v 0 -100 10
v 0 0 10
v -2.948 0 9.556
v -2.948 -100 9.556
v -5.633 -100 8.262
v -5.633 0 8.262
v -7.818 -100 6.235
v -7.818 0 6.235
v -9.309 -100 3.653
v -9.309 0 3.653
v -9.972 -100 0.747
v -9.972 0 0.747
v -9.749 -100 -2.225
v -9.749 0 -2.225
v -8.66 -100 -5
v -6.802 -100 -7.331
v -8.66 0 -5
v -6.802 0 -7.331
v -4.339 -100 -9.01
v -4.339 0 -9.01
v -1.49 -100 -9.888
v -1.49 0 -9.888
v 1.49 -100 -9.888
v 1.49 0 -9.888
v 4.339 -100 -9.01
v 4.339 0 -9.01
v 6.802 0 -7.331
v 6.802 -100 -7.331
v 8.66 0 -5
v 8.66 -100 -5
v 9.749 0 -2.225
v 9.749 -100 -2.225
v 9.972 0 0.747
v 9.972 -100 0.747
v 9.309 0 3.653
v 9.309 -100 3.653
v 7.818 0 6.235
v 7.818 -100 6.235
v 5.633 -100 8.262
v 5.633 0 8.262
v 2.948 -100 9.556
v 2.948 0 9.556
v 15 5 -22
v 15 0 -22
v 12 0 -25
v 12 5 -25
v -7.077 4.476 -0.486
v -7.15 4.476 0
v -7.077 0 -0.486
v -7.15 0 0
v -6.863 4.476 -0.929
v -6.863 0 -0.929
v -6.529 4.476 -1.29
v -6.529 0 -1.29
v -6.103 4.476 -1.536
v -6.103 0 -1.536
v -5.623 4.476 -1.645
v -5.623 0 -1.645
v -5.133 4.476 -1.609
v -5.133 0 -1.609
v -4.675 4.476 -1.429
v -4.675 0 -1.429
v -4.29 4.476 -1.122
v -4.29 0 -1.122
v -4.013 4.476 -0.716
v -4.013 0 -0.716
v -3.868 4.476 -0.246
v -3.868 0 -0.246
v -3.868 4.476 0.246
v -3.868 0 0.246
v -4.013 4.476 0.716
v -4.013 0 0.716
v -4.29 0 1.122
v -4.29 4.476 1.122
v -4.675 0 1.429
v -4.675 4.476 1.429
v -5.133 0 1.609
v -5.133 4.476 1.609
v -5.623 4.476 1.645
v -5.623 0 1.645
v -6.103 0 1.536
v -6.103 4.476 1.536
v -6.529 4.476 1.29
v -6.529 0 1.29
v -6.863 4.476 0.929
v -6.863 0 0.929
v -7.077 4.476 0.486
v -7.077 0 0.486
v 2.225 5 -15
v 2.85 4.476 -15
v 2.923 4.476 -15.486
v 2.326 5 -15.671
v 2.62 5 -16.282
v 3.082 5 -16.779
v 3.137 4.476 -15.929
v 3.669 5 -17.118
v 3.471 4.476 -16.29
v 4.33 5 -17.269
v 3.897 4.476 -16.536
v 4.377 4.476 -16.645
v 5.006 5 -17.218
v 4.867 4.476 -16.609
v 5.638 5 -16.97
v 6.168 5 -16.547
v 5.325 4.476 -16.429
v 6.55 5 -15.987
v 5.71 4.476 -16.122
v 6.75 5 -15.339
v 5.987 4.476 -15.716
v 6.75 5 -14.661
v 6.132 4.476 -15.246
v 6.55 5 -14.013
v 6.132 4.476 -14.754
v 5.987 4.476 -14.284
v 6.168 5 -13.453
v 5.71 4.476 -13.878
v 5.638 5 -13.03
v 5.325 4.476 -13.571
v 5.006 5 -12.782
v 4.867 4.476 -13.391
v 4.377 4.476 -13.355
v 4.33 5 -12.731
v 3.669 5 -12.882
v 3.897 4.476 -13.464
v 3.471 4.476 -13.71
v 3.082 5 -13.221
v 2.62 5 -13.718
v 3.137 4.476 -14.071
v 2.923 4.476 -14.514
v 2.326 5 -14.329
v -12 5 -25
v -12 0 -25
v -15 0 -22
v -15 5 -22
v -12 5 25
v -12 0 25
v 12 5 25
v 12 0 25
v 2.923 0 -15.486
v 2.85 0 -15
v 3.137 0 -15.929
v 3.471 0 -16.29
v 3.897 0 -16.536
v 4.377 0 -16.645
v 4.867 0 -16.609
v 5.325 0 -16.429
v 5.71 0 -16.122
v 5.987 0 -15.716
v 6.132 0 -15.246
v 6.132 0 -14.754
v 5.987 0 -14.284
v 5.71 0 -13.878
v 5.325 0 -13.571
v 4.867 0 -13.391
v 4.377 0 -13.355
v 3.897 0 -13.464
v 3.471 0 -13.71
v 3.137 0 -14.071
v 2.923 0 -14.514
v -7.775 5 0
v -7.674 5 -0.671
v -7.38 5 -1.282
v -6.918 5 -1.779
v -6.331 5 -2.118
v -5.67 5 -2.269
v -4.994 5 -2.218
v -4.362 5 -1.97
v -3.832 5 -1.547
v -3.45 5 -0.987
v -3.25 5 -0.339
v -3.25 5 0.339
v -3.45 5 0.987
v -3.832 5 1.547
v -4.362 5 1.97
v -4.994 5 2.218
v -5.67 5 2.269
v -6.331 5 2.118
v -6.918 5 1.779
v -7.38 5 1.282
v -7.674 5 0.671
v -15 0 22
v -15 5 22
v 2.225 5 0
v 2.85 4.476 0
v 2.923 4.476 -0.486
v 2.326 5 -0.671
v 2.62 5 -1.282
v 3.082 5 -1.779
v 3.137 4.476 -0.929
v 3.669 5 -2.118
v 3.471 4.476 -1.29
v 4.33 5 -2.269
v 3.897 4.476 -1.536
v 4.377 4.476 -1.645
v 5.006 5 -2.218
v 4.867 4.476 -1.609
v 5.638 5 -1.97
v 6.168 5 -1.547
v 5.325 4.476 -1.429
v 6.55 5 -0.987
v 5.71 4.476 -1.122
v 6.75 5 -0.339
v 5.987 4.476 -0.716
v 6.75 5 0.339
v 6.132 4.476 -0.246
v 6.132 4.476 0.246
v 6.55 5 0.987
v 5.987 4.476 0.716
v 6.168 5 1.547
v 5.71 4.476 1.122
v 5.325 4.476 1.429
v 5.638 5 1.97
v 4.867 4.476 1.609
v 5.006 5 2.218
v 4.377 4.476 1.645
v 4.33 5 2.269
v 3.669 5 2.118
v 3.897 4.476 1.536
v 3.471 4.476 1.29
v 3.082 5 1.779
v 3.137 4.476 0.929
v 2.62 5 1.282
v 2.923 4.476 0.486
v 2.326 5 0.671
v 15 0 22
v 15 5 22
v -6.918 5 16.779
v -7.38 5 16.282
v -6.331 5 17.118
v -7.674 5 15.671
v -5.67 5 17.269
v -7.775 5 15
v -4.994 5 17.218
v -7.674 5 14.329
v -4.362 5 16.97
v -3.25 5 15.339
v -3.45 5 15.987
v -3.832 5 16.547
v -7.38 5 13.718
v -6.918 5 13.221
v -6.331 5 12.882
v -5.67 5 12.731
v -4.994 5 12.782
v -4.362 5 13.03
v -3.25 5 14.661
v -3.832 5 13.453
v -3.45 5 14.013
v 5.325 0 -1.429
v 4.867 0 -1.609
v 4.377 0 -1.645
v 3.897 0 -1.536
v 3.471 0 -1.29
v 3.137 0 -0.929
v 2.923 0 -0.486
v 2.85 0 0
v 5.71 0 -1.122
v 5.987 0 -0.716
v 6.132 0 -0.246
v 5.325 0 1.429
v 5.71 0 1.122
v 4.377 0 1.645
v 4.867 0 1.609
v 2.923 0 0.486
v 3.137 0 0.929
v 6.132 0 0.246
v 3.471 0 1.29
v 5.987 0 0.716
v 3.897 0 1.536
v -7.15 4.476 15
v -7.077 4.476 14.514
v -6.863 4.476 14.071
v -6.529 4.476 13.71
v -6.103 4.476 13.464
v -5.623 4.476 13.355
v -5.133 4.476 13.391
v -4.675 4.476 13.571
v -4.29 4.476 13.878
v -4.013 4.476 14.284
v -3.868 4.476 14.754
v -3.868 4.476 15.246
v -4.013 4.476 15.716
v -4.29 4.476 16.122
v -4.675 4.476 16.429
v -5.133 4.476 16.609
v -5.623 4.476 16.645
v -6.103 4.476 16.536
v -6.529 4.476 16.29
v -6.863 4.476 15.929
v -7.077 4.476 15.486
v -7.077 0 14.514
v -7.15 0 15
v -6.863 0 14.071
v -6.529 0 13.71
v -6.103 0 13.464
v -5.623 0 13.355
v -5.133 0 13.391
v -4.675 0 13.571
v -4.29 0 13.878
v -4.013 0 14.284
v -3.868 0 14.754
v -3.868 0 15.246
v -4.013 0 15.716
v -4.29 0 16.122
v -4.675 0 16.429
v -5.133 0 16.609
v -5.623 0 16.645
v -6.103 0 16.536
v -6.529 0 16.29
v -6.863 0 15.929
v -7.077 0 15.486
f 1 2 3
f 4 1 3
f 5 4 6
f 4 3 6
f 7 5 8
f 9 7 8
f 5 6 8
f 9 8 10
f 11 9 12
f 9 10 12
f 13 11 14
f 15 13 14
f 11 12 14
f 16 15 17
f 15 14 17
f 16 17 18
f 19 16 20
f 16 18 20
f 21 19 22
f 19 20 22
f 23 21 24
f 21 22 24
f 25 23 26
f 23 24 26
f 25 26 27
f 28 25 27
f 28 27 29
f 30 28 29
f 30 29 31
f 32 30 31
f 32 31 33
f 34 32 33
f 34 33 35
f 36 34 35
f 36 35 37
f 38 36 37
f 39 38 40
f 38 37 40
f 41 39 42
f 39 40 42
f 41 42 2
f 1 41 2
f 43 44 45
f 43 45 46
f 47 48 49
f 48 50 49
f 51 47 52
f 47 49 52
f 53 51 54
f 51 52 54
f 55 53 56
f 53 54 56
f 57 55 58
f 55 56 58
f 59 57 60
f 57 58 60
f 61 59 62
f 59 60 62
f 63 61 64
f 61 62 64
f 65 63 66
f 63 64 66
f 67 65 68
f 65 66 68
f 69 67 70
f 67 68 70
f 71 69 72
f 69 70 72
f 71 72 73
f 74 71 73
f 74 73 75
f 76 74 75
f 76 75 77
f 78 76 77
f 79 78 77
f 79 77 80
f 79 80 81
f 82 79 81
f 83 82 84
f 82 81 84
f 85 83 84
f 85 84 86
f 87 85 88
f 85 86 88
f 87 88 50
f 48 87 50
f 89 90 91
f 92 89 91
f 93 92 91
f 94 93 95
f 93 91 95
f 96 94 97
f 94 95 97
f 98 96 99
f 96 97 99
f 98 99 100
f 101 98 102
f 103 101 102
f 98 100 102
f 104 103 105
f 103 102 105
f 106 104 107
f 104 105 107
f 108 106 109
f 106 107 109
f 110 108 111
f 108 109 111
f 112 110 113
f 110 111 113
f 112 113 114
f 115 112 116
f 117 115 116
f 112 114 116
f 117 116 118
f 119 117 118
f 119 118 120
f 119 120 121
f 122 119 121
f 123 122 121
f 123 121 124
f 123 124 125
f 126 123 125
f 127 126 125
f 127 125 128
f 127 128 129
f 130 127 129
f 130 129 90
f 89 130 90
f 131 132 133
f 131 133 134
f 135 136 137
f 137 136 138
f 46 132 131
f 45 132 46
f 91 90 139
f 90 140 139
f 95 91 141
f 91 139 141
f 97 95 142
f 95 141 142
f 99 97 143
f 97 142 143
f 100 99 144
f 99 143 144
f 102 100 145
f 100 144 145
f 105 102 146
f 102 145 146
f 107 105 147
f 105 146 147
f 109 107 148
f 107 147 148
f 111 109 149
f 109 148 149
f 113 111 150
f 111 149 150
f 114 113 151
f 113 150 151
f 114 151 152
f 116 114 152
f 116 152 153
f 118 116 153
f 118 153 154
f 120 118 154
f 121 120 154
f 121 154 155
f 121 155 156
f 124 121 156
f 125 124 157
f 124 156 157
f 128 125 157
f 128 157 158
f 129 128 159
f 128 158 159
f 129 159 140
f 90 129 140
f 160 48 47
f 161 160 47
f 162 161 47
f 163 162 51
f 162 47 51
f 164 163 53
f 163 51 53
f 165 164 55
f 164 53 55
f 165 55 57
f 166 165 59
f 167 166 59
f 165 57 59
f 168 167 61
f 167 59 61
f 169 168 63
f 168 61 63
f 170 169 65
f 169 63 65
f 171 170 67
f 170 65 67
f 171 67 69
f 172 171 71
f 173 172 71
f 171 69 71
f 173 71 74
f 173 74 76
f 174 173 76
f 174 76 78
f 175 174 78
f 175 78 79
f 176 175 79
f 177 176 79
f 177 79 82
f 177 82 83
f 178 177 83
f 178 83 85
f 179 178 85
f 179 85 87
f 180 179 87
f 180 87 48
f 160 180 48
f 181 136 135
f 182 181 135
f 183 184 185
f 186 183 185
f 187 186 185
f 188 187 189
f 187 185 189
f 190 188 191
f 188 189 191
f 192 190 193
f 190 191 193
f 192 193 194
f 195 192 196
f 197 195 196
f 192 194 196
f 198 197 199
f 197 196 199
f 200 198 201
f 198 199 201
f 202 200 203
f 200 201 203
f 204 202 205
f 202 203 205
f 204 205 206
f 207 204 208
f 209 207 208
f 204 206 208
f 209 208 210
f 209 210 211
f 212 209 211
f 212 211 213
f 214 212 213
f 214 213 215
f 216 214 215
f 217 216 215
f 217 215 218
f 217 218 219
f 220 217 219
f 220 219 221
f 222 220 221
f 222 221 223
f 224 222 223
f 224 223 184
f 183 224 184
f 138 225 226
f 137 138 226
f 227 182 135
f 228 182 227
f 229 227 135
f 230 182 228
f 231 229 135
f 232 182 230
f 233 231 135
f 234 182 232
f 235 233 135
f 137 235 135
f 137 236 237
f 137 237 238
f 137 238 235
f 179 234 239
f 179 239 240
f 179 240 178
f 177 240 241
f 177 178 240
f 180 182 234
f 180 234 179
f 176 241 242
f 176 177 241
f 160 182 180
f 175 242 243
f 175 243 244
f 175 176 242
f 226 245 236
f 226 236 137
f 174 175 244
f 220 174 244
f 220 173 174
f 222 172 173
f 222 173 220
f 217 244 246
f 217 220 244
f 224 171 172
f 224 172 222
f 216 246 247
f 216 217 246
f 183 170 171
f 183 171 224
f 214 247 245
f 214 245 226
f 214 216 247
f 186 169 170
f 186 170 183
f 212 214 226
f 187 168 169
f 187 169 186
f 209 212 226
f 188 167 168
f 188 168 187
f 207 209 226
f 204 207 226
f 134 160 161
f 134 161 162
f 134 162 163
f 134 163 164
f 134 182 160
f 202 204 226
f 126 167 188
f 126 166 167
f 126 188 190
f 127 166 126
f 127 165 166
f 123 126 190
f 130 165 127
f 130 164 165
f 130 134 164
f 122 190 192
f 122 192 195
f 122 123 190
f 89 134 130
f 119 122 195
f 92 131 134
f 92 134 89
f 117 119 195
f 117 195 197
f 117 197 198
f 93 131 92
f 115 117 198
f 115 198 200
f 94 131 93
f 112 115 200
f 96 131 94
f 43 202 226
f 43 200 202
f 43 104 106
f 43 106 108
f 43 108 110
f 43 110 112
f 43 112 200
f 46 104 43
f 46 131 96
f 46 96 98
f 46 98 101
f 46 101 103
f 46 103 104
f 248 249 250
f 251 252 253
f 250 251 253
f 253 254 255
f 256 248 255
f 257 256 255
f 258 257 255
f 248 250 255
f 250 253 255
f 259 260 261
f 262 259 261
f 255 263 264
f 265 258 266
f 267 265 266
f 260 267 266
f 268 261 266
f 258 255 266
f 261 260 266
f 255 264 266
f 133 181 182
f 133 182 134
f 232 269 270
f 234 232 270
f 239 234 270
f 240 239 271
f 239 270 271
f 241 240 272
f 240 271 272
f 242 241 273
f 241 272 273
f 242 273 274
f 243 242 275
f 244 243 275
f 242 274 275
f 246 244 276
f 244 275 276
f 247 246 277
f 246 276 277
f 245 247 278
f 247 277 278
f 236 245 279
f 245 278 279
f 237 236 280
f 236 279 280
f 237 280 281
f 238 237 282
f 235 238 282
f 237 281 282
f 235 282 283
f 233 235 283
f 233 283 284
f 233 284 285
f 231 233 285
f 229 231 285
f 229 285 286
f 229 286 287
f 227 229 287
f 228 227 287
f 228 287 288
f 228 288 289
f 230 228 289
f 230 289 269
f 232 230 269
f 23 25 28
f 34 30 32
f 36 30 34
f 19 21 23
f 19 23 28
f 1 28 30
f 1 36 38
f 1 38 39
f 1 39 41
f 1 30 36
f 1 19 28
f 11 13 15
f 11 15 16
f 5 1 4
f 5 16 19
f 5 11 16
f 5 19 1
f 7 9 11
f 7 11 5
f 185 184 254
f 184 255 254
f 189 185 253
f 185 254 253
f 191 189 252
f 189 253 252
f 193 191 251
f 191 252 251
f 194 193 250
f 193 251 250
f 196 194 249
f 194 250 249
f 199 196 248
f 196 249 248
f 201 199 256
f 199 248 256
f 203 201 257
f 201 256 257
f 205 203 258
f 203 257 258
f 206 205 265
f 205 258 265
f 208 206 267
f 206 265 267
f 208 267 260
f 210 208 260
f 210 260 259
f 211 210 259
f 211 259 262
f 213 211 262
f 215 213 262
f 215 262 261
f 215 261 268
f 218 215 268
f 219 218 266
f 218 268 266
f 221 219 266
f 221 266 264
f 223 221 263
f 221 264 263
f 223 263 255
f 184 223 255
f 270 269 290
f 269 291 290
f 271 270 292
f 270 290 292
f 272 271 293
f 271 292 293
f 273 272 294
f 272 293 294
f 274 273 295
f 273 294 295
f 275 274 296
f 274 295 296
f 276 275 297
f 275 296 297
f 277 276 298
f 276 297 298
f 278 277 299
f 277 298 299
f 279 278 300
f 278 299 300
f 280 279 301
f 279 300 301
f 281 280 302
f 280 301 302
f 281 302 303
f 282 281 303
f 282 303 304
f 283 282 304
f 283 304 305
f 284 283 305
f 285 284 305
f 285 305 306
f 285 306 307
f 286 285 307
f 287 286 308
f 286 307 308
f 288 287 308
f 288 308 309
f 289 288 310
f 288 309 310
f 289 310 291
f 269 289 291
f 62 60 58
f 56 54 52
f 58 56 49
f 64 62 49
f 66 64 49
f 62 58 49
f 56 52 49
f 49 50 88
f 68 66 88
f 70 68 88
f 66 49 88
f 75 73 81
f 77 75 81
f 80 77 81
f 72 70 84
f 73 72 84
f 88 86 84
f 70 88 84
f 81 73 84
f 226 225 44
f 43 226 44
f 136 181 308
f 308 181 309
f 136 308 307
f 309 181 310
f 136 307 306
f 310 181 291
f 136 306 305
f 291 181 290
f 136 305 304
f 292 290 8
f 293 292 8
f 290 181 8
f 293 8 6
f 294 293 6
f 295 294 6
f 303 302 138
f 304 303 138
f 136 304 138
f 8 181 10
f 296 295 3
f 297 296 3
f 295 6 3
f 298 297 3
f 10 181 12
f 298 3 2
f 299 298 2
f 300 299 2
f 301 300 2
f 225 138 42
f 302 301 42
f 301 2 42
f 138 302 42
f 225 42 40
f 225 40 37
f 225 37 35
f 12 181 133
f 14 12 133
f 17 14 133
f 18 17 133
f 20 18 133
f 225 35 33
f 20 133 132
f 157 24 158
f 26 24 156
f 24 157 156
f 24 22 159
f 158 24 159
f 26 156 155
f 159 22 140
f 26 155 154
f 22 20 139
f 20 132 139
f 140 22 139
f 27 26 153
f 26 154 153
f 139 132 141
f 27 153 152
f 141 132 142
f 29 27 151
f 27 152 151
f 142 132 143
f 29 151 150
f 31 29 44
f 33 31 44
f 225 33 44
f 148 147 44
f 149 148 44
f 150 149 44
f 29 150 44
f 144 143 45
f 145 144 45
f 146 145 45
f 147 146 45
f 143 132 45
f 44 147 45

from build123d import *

# Parameters (mm, degrees)
SKETCH1_W                       = 30
SKETCH1_H                       = 50
BOSS_EXTRUDE1_DEPTH             = 5
M4X0_7_TAPPED_HOLE1_D           = 3.3
M4X0_7_TAPPED_HOLE1_CSINK_D     = 4.55
M4X0_7_TAPPED_HOLE1_CSINK_ANGLE = 100
SKETCH4_R                       = 10
BOSS_EXTRUDE2_DEPTH             = 100
CHAMFER1_SIZE                   = 3


with BuildPart() as part:
    # Sketch1 → Boss-Extrude1 (new body)
    with BuildSketch(Plane(origin=(0, 0, 0), x_dir=(1, 0, 0), z_dir=(0, 1, 0))):
        Rectangle(SKETCH1_W, SKETCH1_H)
    extrude(amount=BOSS_EXTRUDE1_DEPTH)

    # M4x0.7 Tapped Hole1 (through all)
    with Locations(Plane(origin=(0, 5, 0), x_dir=(1, 0, 0), z_dir=(0, 1, 0))):
        with Locations((-5.5, -15), (-5.5, 0), (4.5, 0), (4.5, 15)):
            CounterSinkHole(M4X0_7_TAPPED_HOLE1_D / 2, M4X0_7_TAPPED_HOLE1_CSINK_D / 2, counter_sink_angle=M4X0_7_TAPPED_HOLE1_CSINK_ANGLE)

    # Sketch4 → Boss-Extrude2 (add)
    with BuildSketch(Plane.XZ):
        with Locations(Location((0, 0, 0), (0, 0, 90))):
            Circle(SKETCH4_R)
    extrude(amount=BOSS_EXTRUDE2_DEPTH)

    # Chamfer1
    chamfer1_edges = [part.edges().sort_by_distance(p)[0] for p in [
        (15, 2.5, 25),
        (-15, 2.5, 25),
        (-15, 2.5, -25),
        (15, 2.5, -25),
    ]]
    chamfer(chamfer1_edges, length=CHAMFER1_SIZE)


solid = part.part
